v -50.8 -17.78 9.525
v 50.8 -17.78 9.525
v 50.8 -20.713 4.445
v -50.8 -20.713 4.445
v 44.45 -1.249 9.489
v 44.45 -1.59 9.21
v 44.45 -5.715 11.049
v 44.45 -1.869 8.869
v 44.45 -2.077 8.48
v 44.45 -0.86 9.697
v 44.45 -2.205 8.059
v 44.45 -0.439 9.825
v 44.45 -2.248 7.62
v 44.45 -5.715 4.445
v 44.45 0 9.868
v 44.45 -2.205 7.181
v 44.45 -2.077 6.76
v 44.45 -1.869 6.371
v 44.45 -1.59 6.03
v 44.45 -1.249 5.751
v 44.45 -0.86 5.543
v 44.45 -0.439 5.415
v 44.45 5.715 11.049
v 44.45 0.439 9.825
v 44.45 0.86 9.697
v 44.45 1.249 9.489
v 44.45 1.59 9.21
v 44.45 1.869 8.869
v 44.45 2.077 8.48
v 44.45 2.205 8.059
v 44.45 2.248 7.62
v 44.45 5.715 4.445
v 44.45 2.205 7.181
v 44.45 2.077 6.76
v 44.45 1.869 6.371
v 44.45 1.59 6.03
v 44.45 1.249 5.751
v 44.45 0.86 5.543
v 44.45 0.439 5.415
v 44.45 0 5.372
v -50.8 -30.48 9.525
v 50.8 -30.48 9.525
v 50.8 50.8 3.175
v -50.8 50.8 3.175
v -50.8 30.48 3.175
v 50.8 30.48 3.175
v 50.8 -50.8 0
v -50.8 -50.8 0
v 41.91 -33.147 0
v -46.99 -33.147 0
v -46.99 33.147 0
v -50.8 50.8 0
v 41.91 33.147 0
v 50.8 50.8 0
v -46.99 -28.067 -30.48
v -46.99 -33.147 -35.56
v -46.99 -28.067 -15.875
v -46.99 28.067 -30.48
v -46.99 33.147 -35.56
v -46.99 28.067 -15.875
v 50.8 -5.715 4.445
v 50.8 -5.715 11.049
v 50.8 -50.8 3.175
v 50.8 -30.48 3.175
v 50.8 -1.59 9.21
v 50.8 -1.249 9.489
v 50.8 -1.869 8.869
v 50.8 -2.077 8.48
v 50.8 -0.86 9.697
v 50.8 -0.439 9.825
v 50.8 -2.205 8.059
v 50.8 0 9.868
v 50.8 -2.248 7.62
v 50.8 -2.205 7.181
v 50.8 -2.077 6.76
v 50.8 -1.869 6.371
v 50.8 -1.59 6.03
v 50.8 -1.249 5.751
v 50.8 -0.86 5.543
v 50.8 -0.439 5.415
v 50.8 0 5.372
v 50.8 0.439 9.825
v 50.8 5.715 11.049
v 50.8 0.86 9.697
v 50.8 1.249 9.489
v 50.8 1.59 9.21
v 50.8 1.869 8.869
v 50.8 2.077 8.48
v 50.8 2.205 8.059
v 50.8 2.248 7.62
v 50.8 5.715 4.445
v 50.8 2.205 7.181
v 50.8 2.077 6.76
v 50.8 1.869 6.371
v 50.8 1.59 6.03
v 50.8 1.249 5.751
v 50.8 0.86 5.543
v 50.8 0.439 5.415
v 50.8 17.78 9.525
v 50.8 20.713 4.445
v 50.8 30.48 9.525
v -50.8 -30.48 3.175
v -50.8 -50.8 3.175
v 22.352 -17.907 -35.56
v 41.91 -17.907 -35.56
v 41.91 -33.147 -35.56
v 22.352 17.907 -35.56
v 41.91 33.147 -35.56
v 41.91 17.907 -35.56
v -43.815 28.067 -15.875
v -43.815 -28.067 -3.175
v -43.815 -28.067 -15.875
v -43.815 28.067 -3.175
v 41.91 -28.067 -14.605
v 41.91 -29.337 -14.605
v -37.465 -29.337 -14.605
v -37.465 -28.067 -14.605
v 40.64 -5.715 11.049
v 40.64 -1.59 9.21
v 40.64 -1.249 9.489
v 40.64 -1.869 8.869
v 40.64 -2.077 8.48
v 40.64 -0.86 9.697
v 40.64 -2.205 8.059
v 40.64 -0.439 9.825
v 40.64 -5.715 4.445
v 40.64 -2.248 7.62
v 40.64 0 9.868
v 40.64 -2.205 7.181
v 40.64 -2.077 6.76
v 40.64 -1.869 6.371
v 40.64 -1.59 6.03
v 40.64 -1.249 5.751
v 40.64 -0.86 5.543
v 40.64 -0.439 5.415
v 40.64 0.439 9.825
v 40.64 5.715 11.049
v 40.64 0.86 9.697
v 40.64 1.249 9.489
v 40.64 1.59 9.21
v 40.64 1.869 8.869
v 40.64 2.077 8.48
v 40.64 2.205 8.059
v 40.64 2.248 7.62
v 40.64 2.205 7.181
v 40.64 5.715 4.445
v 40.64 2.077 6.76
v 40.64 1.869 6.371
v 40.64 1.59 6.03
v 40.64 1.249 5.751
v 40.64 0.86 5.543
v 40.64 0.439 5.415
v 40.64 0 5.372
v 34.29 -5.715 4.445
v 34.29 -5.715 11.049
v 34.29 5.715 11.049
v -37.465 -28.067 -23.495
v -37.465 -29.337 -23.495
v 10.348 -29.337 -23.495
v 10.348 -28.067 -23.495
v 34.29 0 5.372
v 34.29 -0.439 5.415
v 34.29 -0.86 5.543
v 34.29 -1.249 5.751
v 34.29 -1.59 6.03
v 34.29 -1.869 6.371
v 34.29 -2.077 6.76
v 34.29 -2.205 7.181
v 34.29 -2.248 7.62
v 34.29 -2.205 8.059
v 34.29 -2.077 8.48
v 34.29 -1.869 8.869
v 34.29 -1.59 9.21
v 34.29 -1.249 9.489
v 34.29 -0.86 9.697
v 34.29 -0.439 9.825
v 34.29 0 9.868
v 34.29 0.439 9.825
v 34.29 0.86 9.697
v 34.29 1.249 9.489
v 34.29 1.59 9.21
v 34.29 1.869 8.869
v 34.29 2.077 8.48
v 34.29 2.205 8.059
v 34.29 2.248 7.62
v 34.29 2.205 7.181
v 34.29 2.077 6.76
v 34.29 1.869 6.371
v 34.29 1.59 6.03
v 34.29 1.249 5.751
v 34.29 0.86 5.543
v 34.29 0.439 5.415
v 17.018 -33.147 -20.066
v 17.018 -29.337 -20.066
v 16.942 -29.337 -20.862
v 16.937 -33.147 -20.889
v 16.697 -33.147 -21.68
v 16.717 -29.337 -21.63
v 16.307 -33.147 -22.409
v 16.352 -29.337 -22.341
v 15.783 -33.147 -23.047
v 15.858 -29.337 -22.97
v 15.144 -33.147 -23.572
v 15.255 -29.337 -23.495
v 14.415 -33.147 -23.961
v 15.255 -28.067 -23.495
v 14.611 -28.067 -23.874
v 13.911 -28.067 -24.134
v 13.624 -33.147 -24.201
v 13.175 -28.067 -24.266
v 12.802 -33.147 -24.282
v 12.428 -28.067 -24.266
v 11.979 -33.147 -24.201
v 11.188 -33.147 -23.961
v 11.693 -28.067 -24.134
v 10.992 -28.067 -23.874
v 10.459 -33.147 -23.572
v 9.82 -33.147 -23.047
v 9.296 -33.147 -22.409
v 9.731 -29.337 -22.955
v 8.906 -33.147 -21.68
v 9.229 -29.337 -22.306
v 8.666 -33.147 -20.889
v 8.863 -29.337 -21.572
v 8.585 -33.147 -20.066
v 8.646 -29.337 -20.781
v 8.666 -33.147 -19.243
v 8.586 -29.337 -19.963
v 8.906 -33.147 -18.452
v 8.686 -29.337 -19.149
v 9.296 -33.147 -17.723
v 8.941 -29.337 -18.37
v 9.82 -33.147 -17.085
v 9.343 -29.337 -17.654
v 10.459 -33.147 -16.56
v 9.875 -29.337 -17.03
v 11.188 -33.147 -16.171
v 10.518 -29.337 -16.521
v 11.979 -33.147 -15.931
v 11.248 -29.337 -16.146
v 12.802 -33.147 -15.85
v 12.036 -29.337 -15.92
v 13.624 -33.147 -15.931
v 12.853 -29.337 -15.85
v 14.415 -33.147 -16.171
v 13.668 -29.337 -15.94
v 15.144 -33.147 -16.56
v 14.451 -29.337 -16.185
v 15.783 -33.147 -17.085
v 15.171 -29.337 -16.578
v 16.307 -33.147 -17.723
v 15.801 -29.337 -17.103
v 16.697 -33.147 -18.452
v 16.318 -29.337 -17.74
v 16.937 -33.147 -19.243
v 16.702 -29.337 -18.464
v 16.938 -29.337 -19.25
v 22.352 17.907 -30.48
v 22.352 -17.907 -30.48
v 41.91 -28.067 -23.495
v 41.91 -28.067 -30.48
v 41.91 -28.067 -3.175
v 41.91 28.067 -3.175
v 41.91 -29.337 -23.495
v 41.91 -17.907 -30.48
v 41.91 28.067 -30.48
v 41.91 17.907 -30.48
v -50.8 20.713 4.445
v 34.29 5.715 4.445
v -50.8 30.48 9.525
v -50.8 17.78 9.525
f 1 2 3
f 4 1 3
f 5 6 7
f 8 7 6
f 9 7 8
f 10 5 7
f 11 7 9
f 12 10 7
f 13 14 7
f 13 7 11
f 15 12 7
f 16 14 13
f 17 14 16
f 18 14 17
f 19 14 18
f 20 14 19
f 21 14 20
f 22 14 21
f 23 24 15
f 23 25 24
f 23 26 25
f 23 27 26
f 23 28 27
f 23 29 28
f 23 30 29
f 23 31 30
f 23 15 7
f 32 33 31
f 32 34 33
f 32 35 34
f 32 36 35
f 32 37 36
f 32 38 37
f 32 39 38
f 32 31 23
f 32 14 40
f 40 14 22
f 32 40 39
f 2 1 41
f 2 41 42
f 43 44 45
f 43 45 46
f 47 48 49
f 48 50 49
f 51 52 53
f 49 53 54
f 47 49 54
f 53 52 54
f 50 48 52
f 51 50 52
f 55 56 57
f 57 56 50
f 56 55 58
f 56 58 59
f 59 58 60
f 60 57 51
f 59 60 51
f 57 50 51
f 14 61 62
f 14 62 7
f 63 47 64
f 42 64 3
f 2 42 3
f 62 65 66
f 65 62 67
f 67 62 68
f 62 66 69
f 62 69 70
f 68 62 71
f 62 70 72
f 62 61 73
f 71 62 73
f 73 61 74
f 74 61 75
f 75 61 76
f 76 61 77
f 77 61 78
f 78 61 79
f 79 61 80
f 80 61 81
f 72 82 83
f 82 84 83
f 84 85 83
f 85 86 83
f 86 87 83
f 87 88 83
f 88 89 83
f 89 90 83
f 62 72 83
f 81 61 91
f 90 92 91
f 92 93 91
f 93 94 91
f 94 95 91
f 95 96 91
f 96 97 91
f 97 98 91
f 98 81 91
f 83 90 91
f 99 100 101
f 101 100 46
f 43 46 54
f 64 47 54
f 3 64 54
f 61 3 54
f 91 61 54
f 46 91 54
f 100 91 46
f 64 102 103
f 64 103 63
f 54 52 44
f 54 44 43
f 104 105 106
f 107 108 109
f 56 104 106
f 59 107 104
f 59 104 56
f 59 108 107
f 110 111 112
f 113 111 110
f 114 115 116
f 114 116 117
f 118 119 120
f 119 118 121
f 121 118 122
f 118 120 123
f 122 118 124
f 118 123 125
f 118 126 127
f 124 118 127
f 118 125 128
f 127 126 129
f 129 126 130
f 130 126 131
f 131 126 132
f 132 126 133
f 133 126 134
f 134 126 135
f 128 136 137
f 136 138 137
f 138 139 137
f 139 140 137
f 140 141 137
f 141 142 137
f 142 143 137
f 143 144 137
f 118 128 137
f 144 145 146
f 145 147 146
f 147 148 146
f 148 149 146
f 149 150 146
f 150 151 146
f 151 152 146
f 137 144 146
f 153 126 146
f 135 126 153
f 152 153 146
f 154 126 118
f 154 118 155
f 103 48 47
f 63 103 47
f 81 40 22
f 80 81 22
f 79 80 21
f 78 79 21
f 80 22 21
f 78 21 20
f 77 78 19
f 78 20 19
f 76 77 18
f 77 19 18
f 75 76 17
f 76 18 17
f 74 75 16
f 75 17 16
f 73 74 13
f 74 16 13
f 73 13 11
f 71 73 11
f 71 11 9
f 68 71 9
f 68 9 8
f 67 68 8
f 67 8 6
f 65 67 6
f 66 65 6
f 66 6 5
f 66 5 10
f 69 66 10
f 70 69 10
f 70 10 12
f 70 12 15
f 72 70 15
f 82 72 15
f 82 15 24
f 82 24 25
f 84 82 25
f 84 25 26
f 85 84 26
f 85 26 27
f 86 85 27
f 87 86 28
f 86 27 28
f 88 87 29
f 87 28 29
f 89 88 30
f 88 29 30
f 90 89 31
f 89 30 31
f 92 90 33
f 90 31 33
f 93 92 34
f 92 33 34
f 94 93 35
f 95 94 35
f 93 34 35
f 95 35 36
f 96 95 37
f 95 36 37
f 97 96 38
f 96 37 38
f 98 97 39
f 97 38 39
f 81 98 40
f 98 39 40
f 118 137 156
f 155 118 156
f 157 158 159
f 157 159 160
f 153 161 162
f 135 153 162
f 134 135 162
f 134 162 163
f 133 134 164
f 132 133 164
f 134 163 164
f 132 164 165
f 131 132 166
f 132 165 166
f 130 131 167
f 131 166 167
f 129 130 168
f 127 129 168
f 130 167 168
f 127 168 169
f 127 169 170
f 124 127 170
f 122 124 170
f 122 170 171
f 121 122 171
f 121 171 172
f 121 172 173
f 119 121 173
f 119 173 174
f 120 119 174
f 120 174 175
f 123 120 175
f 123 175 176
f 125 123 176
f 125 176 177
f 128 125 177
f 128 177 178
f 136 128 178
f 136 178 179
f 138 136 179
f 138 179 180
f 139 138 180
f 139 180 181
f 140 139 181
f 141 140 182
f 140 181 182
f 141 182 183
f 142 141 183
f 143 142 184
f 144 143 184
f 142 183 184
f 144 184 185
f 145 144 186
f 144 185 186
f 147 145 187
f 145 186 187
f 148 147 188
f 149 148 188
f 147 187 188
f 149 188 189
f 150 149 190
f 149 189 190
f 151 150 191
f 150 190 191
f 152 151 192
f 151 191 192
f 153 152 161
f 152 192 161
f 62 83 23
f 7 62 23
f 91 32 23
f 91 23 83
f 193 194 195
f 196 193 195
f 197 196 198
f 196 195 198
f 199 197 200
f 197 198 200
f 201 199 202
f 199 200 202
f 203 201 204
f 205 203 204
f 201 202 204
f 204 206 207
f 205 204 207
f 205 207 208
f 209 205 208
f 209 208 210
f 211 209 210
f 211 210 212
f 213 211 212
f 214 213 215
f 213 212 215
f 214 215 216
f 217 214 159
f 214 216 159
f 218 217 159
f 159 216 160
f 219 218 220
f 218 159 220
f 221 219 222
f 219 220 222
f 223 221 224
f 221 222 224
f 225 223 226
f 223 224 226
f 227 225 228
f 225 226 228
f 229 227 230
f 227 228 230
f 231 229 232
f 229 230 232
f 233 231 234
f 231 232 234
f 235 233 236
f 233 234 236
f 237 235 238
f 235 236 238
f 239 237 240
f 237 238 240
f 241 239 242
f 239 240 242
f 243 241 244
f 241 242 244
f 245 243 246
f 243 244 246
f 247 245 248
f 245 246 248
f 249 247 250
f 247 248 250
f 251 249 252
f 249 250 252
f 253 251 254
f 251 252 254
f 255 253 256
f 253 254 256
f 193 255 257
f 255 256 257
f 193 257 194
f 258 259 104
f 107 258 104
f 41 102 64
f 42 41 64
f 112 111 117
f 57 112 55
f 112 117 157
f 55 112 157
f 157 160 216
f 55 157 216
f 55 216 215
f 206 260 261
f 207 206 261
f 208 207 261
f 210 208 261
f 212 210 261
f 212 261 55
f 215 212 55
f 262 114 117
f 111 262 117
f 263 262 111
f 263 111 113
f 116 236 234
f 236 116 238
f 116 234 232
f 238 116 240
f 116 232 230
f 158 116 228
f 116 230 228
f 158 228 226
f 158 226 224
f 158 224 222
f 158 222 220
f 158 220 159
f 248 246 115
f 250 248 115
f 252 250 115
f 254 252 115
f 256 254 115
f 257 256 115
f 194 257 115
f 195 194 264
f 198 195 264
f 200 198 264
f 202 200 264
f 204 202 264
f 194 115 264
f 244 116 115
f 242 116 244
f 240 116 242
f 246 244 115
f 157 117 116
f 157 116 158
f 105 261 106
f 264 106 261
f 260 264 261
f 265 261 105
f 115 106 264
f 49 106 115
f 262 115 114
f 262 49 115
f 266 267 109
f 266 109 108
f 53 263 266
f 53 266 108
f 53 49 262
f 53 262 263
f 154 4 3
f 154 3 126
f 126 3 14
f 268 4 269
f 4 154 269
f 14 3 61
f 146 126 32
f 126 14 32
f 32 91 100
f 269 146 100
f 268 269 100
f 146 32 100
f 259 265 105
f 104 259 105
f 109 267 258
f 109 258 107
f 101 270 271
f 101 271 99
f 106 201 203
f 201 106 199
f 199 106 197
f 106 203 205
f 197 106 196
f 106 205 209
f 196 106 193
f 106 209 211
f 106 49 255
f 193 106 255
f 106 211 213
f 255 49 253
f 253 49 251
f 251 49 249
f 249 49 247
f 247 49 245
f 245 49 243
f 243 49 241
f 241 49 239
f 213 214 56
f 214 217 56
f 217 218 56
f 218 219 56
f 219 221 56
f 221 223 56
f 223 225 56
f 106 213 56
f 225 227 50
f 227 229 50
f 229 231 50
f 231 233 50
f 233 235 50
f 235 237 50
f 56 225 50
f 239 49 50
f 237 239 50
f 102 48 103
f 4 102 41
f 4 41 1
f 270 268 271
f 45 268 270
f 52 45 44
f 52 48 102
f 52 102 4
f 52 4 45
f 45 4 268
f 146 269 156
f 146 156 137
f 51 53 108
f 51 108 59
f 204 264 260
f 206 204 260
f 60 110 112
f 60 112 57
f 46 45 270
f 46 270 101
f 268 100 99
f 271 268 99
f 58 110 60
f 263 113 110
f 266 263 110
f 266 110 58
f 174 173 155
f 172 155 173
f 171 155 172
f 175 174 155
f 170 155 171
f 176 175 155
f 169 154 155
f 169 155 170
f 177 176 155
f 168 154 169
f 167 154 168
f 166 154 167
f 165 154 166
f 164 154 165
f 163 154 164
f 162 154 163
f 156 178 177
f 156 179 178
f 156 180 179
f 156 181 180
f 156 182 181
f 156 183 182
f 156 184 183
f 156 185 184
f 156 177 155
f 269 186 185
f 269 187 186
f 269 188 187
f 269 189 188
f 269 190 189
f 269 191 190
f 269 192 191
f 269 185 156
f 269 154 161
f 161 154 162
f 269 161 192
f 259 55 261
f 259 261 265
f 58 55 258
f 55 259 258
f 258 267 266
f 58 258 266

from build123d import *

# Parameters (mm, degrees)
SKETCH1_W                    = 101.6
SKETCH1_H                    = 101.6
EXTRUDE1_DEPTH               = 3.175
SKETCH2_W                    = 101.6
SKETCH2_H                    = 60.96
EXTRUDE2_DEPTH               = 6.35
EXTRUDE3_DEPTH               = 114.990901501
SKETCH4_W                    = 88.9
SKETCH4_H                    = 66.294
EXTRUDE4_DEPTH               = 35.56
SKETCH5_W                    = 27.305
SKETCH5_H                    = 56.134
EXTRUDE5_DEPTH               = 112.536082502
SKETCH6_W                    = 3.175
SKETCH6_H                    = 56.134
EXTRUDE6_DEPTH               = 12.7
SKETCH7_W                    = 8.89
SKETCH7_H                    = 1.27
EXTRUDE7_DEPTH               = 79.375
SKETCH8_W                    = 5.08
SKETCH8_H                    = 35.814
EXTRUDE8_DEPTH               = 19.558
F_5_16_CLEARANCE_HOLE1_D     = 8.4328
F_5_16_CLEARANCE_HOLE1_DEPTH = 12.954
F_5_16_CLEARANCE_HOLE1_TIP   = 2.533468714
EXTRUDE9_DEPTH               = 6.604
F_8_CLEARANCE_HOLE1_D        = 4.4958
LPATTERN1_COUNT              = 2
LPATTERN1_PITCH              = 10.16


with BuildPart() as part:
    # Sketch1 → Extrude1 (new body)
    with BuildSketch(Plane.XY):
        Rectangle(SKETCH1_W, SKETCH1_H)
    extrude(amount=EXTRUDE1_DEPTH)

    # Sketch2 → Extrude2 (add)
    with BuildSketch(Plane.XY.offset(3.175)):
        Rectangle(SKETCH2_W, SKETCH2_H)
    extrude(amount=EXTRUDE2_DEPTH)

    # Sketch3 → Extrude3 (cut, through all)
    with BuildSketch(Plane(origin=(50.8, 0, 0), x_dir=(0, 0, -1), z_dir=(1, 0, 0))):
        Polygon((-9.525, -17.78), (-4.445, -20.712939367), (-4.445, 20.712939367), (-9.525, 17.78), align=None)
    extrude(amount=-EXTRUDE3_DEPTH, mode=Mode.SUBTRACT)

    # Sketch4 → Extrude4 (add)
    with BuildSketch(Plane(origin=(0, 0, 0), x_dir=(-1, 0, 0), z_dir=(0, 0, -1))):
        with Locations((2.54, 0)):
            Rectangle(SKETCH4_W, SKETCH4_H)
    extrude(amount=EXTRUDE4_DEPTH)

    # Sketch5 → Extrude5 (cut, through all)
    with BuildSketch(Plane(origin=(41.91, 0, 0), x_dir=(0, 0, -1), z_dir=(1, 0, 0))):
        with Locations((16.8275, 0)):
            Rectangle(SKETCH5_W, SKETCH5_H)
    extrude(amount=-EXTRUDE5_DEPTH, mode=Mode.SUBTRACT)

    # Sketch6 → Extrude6 (add)
    with BuildSketch(Plane(origin=(0, 0, -3.175), x_dir=(-1, 0, 0), z_dir=(0, 0, -1))):
        with Locations((45.4025, 0)):
            Rectangle(SKETCH6_W, SKETCH6_H)
    extrude(amount=EXTRUDE6_DEPTH)

    # Sketch7 → Extrude7 (cut)
    with BuildSketch(Plane(origin=(41.91, 0, 0), x_dir=(0, 0, -1), z_dir=(1, 0, 0))):
        with Locations((19.05, -28.702)):
            Rectangle(SKETCH7_W, SKETCH7_H)
    extrude(amount=-EXTRUDE7_DEPTH, mode=Mode.SUBTRACT)

    # Sketch8 → Extrude8 (cut)
    with BuildSketch(Plane(origin=(41.91, 0, 0), x_dir=(0, 0, -1), z_dir=(1, 0, 0))):
        with Locations((33.02, 0)):
            Rectangle(SKETCH8_W, SKETCH8_H)
    extrude(amount=-EXTRUDE8_DEPTH, mode=Mode.SUBTRACT)

    # 5/16 Clearance Hole1
    with Locations(Plane(origin=(12.8016, -33.147, -20.066), x_dir=(-1, 0, 0), z_dir=(0, -1, 0))):
        with Locations((0, 0)):
            Hole(F_5_16_CLEARANCE_HOLE1_D / 2, depth=F_5_16_CLEARANCE_HOLE1_DEPTH)
            with Locations((0, 0, -(F_5_16_CLEARANCE_HOLE1_DEPTH + F_5_16_CLEARANCE_HOLE1_TIP / 2))):  # 118° drill point
                Cone(0, F_5_16_CLEARANCE_HOLE1_D / 2, F_5_16_CLEARANCE_HOLE1_TIP, mode=Mode.SUBTRACT)

    # Sketch11 → Extrude9 (add)
    with BuildSketch(Plane.XY.offset(4.445)):
        Polygon((50.8, 0), (50.8, -5.715), (44.45, -5.715), (44.45, 5.715), (50.8, 5.715), align=None)
    extrude9 = extrude(amount=EXTRUDE9_DEPTH)

    # #8 Clearance Hole1 (through all)
    with Locations(Plane(origin=(50.8, 0, 7.62), x_dir=(0, 0, 1), z_dir=(1, 0, 0))):
        with Locations((0, 0)):
            f_8_clearance_hole1 = Hole(F_8_CLEARANCE_HOLE1_D / 2)

    # LPattern1: Extrude9, #8 Clearance Hole1 ×2
    with Locations(*[(-i * LPATTERN1_PITCH, 0, 0) for i in range(1, LPATTERN1_COUNT)]):
        add(extrude9)
        add(f_8_clearance_hole1, mode=Mode.SUBTRACT)


solid = part.part
